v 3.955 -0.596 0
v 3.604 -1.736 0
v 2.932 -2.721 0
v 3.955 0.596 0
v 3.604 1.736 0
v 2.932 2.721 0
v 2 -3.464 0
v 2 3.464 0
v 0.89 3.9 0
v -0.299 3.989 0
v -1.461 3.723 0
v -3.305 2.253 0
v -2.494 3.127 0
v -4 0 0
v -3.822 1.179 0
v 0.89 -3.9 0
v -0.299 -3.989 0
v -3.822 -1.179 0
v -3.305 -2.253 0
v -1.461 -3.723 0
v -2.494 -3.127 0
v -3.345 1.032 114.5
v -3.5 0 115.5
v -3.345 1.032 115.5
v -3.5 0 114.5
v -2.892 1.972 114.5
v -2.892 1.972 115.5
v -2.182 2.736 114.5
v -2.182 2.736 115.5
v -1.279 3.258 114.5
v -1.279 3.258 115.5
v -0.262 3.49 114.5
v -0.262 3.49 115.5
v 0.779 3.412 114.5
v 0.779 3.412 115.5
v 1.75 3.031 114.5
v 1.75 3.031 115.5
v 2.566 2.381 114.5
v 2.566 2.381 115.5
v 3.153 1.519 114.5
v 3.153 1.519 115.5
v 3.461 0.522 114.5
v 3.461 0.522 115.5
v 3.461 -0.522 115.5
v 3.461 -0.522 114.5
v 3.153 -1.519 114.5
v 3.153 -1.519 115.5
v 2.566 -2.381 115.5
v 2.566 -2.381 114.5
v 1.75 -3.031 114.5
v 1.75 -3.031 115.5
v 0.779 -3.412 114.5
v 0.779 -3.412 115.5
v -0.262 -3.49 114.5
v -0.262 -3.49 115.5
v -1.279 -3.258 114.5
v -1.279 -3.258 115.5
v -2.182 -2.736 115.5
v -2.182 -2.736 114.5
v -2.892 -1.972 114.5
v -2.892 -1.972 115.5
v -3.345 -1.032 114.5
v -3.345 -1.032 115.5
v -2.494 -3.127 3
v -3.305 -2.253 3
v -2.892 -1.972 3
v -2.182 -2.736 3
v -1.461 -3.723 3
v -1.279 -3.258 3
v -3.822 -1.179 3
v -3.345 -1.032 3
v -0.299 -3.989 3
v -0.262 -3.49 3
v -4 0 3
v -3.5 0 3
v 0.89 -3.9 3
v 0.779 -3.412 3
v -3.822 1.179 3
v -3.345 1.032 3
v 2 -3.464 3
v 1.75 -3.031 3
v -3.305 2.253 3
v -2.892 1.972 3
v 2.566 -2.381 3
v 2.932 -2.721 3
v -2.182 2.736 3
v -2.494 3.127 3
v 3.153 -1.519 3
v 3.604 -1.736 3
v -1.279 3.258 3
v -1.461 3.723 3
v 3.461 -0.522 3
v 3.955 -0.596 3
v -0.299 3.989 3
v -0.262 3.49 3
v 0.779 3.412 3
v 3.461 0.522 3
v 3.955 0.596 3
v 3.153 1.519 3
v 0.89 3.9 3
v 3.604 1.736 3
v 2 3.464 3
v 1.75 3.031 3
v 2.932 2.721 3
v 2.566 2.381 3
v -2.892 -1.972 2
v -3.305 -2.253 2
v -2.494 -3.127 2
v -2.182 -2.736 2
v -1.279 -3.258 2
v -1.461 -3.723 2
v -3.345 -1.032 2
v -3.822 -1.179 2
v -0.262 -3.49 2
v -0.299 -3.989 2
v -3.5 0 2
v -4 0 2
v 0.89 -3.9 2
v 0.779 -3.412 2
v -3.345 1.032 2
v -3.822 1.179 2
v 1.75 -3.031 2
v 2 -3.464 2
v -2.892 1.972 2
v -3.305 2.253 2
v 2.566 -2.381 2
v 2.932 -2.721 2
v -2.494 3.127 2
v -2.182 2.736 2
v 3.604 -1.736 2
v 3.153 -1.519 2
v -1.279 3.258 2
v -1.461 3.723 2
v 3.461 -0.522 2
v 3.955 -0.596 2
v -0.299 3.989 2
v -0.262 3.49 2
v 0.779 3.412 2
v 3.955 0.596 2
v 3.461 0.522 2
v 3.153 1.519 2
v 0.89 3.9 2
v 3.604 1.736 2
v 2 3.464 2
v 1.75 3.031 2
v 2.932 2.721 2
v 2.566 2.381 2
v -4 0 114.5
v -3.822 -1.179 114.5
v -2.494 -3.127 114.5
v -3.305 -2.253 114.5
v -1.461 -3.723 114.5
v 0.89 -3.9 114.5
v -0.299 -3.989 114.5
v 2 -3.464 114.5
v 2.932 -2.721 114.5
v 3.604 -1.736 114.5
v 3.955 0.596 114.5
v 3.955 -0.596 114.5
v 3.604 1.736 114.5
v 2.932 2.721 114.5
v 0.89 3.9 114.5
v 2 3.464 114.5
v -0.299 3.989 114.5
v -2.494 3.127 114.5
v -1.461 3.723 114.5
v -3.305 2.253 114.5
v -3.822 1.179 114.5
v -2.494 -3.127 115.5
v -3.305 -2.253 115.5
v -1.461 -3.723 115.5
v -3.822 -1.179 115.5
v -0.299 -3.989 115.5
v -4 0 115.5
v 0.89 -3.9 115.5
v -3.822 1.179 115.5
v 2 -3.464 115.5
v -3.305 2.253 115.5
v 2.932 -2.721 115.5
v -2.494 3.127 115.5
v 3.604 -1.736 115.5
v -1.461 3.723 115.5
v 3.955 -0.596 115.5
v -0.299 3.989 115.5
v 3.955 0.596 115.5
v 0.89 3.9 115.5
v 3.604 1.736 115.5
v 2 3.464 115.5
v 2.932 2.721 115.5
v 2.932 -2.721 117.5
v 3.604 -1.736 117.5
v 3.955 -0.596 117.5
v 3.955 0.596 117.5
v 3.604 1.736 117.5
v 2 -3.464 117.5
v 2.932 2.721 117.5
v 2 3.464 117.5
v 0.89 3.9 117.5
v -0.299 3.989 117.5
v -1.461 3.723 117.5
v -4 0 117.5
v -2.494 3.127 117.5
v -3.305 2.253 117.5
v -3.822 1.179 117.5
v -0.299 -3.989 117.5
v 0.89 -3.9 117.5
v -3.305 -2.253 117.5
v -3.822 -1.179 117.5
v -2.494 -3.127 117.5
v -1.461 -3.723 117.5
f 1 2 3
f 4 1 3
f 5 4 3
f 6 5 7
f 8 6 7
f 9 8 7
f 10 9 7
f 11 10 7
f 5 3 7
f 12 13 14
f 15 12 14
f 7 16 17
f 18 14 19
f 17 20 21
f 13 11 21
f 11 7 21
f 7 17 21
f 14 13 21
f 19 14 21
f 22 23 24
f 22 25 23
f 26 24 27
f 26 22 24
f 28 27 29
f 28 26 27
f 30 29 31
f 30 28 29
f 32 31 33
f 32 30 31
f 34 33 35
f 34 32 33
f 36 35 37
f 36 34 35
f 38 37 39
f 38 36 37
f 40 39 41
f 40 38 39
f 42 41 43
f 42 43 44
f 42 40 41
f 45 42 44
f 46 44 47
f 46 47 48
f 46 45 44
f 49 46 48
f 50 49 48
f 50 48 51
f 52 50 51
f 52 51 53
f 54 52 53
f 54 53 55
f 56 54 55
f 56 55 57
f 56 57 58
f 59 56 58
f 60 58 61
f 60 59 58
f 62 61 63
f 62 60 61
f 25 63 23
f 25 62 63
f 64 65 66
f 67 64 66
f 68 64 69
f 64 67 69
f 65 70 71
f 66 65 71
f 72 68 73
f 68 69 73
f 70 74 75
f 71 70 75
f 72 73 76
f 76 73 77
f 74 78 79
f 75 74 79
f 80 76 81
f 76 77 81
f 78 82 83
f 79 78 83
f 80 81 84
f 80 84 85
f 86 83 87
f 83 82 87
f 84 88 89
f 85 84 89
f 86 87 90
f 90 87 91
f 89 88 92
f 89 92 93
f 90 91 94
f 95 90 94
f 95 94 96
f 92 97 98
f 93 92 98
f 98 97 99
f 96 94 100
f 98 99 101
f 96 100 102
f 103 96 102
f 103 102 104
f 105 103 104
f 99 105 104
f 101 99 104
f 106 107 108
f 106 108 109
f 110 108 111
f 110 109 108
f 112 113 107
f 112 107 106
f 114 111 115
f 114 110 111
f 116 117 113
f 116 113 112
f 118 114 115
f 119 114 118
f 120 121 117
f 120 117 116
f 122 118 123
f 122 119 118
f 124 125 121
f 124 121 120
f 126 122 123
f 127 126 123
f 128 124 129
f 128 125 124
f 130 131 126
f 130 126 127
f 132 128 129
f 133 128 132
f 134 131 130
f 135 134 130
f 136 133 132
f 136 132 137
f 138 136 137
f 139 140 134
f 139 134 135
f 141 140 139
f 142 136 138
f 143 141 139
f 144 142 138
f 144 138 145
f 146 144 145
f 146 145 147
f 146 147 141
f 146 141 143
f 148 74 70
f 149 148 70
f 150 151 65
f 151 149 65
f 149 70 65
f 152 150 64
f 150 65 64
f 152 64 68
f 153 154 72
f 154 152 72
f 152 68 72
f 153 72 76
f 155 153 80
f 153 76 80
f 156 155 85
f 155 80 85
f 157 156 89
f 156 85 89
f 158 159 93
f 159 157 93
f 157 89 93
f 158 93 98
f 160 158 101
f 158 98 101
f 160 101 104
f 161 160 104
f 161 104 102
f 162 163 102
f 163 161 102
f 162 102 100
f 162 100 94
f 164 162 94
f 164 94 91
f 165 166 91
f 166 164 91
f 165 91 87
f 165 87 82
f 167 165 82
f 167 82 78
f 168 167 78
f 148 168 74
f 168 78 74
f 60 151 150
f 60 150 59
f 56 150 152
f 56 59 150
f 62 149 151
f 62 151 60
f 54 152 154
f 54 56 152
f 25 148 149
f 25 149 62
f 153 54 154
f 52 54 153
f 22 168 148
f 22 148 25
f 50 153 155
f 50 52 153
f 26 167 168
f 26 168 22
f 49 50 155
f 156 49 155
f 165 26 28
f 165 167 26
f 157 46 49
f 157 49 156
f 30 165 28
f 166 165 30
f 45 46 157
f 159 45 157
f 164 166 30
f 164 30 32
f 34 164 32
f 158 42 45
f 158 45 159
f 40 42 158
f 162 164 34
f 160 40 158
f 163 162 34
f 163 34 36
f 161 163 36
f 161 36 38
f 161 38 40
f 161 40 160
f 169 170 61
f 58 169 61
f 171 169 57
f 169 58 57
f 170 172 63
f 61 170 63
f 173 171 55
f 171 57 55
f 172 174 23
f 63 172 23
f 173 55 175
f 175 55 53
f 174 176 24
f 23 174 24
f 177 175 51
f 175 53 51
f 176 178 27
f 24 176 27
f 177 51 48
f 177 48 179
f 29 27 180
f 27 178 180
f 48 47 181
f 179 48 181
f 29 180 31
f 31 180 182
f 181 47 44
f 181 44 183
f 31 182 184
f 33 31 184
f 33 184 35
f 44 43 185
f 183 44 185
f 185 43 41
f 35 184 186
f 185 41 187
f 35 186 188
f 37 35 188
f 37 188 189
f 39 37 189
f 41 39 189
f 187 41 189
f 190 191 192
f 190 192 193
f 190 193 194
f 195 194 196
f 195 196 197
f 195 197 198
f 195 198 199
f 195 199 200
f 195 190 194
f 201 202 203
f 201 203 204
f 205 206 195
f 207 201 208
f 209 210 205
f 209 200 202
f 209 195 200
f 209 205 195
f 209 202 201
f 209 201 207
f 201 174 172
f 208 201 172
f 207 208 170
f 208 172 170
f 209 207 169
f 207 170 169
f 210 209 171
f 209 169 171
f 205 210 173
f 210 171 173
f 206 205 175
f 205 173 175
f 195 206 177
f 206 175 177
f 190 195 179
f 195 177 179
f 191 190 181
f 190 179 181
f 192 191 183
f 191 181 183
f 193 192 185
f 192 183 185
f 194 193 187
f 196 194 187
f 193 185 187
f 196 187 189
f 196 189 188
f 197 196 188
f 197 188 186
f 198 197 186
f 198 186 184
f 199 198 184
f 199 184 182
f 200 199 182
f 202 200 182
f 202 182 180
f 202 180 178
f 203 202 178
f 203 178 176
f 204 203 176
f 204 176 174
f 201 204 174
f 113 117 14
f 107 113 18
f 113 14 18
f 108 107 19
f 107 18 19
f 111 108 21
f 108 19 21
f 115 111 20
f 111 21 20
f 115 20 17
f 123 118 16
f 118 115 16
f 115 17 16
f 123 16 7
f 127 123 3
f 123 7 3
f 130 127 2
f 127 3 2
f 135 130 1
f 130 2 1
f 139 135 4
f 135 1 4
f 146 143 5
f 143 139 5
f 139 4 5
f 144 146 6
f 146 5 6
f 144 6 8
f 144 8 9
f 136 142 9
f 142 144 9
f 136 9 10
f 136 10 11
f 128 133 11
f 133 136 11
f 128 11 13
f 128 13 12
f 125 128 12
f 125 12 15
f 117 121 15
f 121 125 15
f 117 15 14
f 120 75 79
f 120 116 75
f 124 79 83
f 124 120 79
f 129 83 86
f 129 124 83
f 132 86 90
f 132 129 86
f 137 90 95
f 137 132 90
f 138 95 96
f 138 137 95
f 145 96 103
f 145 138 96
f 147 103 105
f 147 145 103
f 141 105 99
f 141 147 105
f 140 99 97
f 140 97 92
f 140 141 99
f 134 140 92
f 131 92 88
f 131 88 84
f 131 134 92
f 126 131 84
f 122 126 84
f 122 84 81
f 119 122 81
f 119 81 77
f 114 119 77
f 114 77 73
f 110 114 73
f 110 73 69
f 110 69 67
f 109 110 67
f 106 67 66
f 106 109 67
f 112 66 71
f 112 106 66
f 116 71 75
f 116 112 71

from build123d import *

# Parameters (mm, degrees)
SKETCH_1_R      = 4
EXTRUDE_1_DEPTH = 117.5
SKETCH_2_W      = 0.5
SKETCH_2_H      = 1


with BuildPart() as part:
    # ｽｹｯﾁ1 → ﾎﾞｽ - 押し出し1 (new body)
    with BuildSketch(Plane.XY):
        Circle(SKETCH_1_R)
    extrude(amount=EXTRUDE_1_DEPTH)

    # ｽｹｯﾁ2 → ｶｯﾄ - 回転1 (revolve, cut)
    with BuildSketch(Plane(origin=(0, 0, 0), x_dir=(1, 0, 0), z_dir=(0, 1, 0))):
        with Locations((3.75, -2.5)):
            Rectangle(SKETCH_2_W, SKETCH_2_H)
        with Locations((3.75, -115)):
            Rectangle(SKETCH_2_W, SKETCH_2_H)
    revolve(axis=Axis((0, 0, 117.5), (0, 0, -1)), mode=Mode.SUBTRACT)


solid = part.part
